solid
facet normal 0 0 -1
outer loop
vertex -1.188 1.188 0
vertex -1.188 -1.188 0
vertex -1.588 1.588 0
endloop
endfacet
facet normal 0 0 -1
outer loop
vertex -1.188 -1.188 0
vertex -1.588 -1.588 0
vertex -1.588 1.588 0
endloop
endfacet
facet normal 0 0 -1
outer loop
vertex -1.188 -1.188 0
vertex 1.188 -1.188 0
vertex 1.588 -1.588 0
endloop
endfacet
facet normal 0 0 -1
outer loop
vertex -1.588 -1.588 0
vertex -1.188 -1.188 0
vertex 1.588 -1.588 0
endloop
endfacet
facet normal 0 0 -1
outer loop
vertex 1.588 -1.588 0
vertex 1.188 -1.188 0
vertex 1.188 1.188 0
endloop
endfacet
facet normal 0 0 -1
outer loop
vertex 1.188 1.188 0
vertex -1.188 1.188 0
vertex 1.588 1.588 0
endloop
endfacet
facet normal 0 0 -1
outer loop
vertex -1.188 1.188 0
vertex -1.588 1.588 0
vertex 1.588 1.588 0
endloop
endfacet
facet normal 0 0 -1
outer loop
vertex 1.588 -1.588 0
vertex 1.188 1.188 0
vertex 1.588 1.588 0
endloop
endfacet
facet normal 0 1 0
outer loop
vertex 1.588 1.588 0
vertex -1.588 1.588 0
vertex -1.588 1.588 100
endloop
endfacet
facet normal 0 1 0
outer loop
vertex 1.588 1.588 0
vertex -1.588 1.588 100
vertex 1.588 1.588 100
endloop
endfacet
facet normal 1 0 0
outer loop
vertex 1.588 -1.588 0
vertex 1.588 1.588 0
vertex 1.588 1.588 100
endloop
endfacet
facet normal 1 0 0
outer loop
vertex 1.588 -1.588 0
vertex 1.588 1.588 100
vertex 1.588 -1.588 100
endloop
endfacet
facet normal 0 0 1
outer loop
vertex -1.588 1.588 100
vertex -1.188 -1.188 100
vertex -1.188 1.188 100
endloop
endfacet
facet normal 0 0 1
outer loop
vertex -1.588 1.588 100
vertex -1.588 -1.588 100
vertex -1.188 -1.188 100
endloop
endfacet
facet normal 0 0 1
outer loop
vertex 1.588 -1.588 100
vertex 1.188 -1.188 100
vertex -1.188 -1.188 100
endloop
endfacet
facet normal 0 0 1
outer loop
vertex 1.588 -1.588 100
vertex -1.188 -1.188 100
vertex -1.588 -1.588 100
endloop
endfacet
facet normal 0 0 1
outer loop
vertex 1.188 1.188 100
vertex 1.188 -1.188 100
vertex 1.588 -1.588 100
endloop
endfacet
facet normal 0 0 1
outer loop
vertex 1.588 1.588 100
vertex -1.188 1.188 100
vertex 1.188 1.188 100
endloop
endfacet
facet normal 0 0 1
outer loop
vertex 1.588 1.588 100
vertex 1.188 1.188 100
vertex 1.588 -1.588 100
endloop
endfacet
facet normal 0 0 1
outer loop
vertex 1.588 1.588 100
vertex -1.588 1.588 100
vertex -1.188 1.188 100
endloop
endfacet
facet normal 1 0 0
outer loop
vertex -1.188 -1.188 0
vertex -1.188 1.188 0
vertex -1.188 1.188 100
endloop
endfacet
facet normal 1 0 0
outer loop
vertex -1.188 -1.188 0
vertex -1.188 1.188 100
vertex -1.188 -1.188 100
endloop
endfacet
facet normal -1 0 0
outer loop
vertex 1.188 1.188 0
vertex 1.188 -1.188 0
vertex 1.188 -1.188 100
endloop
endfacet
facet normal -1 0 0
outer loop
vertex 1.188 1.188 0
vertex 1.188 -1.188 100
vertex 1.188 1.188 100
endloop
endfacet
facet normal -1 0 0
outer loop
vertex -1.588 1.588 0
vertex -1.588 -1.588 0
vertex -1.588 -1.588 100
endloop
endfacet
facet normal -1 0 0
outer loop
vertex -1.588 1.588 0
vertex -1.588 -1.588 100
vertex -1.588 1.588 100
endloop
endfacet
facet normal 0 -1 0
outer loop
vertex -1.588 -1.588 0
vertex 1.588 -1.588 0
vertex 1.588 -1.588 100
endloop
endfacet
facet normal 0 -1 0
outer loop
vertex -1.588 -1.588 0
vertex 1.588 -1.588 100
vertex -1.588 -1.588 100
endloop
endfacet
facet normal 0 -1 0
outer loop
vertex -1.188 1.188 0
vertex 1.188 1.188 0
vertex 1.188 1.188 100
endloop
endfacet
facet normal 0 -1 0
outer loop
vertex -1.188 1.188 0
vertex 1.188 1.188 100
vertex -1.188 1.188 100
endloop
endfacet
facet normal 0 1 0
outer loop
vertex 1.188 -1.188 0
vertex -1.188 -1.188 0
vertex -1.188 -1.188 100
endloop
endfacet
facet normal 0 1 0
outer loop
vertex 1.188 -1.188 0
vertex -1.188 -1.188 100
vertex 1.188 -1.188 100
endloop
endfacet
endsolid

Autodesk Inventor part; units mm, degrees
ref_plane "YZ Plane" through (0, 0, 0) normal (1, 0, 0) x (0, 1, 0)
ref_plane "XZ Plane" through (0, 0, 0) normal (0, 1, 0) x (-1, 0, 0)
ref_plane "XY Plane" through (0, 0, 0) normal (0, 0, 1) x (1, 0, 0)
sketch "Sketch1" plane through (0, 0, 0) normal (0, 0, 1) x (1, 0, 0)
  line L0 (-1.5875, 1.5875) -> (1.5875, 1.5875)
  line L1 (1.5875, 1.5875) -> (1.5875, -1.5875)
  line L2 (1.5875, -1.5875) -> (-1.5875, -1.5875)
  line L3 (-1.5875, -1.5875) -> (-1.5875, 1.5875)
  line L4 (-1.5875, 1.5875) -> (1.5875, -1.5875) construction
  line L5 (1.5875, 1.5875) -> (-1.5875, -1.5875) construction
  line L6 (-1.1875, -1.1875) -> (1.1875, -1.1875)
  line L7 (1.1875, -1.1875) -> (1.1875, 1.1875)
  line L8 (1.1875, 1.1875) -> (-1.1875, 1.1875)
  line L9 (-1.1875, 1.1875) -> (-1.1875, -1.1875)
  point P0 (0, 0)
  dimension "d0" = 3.175
  dimension "d1" = 0.4
extrude "Extrusion1" add sketch "Sketch1" along normal blind 100
properties part number "Rail" material "Aluminum 6061"
